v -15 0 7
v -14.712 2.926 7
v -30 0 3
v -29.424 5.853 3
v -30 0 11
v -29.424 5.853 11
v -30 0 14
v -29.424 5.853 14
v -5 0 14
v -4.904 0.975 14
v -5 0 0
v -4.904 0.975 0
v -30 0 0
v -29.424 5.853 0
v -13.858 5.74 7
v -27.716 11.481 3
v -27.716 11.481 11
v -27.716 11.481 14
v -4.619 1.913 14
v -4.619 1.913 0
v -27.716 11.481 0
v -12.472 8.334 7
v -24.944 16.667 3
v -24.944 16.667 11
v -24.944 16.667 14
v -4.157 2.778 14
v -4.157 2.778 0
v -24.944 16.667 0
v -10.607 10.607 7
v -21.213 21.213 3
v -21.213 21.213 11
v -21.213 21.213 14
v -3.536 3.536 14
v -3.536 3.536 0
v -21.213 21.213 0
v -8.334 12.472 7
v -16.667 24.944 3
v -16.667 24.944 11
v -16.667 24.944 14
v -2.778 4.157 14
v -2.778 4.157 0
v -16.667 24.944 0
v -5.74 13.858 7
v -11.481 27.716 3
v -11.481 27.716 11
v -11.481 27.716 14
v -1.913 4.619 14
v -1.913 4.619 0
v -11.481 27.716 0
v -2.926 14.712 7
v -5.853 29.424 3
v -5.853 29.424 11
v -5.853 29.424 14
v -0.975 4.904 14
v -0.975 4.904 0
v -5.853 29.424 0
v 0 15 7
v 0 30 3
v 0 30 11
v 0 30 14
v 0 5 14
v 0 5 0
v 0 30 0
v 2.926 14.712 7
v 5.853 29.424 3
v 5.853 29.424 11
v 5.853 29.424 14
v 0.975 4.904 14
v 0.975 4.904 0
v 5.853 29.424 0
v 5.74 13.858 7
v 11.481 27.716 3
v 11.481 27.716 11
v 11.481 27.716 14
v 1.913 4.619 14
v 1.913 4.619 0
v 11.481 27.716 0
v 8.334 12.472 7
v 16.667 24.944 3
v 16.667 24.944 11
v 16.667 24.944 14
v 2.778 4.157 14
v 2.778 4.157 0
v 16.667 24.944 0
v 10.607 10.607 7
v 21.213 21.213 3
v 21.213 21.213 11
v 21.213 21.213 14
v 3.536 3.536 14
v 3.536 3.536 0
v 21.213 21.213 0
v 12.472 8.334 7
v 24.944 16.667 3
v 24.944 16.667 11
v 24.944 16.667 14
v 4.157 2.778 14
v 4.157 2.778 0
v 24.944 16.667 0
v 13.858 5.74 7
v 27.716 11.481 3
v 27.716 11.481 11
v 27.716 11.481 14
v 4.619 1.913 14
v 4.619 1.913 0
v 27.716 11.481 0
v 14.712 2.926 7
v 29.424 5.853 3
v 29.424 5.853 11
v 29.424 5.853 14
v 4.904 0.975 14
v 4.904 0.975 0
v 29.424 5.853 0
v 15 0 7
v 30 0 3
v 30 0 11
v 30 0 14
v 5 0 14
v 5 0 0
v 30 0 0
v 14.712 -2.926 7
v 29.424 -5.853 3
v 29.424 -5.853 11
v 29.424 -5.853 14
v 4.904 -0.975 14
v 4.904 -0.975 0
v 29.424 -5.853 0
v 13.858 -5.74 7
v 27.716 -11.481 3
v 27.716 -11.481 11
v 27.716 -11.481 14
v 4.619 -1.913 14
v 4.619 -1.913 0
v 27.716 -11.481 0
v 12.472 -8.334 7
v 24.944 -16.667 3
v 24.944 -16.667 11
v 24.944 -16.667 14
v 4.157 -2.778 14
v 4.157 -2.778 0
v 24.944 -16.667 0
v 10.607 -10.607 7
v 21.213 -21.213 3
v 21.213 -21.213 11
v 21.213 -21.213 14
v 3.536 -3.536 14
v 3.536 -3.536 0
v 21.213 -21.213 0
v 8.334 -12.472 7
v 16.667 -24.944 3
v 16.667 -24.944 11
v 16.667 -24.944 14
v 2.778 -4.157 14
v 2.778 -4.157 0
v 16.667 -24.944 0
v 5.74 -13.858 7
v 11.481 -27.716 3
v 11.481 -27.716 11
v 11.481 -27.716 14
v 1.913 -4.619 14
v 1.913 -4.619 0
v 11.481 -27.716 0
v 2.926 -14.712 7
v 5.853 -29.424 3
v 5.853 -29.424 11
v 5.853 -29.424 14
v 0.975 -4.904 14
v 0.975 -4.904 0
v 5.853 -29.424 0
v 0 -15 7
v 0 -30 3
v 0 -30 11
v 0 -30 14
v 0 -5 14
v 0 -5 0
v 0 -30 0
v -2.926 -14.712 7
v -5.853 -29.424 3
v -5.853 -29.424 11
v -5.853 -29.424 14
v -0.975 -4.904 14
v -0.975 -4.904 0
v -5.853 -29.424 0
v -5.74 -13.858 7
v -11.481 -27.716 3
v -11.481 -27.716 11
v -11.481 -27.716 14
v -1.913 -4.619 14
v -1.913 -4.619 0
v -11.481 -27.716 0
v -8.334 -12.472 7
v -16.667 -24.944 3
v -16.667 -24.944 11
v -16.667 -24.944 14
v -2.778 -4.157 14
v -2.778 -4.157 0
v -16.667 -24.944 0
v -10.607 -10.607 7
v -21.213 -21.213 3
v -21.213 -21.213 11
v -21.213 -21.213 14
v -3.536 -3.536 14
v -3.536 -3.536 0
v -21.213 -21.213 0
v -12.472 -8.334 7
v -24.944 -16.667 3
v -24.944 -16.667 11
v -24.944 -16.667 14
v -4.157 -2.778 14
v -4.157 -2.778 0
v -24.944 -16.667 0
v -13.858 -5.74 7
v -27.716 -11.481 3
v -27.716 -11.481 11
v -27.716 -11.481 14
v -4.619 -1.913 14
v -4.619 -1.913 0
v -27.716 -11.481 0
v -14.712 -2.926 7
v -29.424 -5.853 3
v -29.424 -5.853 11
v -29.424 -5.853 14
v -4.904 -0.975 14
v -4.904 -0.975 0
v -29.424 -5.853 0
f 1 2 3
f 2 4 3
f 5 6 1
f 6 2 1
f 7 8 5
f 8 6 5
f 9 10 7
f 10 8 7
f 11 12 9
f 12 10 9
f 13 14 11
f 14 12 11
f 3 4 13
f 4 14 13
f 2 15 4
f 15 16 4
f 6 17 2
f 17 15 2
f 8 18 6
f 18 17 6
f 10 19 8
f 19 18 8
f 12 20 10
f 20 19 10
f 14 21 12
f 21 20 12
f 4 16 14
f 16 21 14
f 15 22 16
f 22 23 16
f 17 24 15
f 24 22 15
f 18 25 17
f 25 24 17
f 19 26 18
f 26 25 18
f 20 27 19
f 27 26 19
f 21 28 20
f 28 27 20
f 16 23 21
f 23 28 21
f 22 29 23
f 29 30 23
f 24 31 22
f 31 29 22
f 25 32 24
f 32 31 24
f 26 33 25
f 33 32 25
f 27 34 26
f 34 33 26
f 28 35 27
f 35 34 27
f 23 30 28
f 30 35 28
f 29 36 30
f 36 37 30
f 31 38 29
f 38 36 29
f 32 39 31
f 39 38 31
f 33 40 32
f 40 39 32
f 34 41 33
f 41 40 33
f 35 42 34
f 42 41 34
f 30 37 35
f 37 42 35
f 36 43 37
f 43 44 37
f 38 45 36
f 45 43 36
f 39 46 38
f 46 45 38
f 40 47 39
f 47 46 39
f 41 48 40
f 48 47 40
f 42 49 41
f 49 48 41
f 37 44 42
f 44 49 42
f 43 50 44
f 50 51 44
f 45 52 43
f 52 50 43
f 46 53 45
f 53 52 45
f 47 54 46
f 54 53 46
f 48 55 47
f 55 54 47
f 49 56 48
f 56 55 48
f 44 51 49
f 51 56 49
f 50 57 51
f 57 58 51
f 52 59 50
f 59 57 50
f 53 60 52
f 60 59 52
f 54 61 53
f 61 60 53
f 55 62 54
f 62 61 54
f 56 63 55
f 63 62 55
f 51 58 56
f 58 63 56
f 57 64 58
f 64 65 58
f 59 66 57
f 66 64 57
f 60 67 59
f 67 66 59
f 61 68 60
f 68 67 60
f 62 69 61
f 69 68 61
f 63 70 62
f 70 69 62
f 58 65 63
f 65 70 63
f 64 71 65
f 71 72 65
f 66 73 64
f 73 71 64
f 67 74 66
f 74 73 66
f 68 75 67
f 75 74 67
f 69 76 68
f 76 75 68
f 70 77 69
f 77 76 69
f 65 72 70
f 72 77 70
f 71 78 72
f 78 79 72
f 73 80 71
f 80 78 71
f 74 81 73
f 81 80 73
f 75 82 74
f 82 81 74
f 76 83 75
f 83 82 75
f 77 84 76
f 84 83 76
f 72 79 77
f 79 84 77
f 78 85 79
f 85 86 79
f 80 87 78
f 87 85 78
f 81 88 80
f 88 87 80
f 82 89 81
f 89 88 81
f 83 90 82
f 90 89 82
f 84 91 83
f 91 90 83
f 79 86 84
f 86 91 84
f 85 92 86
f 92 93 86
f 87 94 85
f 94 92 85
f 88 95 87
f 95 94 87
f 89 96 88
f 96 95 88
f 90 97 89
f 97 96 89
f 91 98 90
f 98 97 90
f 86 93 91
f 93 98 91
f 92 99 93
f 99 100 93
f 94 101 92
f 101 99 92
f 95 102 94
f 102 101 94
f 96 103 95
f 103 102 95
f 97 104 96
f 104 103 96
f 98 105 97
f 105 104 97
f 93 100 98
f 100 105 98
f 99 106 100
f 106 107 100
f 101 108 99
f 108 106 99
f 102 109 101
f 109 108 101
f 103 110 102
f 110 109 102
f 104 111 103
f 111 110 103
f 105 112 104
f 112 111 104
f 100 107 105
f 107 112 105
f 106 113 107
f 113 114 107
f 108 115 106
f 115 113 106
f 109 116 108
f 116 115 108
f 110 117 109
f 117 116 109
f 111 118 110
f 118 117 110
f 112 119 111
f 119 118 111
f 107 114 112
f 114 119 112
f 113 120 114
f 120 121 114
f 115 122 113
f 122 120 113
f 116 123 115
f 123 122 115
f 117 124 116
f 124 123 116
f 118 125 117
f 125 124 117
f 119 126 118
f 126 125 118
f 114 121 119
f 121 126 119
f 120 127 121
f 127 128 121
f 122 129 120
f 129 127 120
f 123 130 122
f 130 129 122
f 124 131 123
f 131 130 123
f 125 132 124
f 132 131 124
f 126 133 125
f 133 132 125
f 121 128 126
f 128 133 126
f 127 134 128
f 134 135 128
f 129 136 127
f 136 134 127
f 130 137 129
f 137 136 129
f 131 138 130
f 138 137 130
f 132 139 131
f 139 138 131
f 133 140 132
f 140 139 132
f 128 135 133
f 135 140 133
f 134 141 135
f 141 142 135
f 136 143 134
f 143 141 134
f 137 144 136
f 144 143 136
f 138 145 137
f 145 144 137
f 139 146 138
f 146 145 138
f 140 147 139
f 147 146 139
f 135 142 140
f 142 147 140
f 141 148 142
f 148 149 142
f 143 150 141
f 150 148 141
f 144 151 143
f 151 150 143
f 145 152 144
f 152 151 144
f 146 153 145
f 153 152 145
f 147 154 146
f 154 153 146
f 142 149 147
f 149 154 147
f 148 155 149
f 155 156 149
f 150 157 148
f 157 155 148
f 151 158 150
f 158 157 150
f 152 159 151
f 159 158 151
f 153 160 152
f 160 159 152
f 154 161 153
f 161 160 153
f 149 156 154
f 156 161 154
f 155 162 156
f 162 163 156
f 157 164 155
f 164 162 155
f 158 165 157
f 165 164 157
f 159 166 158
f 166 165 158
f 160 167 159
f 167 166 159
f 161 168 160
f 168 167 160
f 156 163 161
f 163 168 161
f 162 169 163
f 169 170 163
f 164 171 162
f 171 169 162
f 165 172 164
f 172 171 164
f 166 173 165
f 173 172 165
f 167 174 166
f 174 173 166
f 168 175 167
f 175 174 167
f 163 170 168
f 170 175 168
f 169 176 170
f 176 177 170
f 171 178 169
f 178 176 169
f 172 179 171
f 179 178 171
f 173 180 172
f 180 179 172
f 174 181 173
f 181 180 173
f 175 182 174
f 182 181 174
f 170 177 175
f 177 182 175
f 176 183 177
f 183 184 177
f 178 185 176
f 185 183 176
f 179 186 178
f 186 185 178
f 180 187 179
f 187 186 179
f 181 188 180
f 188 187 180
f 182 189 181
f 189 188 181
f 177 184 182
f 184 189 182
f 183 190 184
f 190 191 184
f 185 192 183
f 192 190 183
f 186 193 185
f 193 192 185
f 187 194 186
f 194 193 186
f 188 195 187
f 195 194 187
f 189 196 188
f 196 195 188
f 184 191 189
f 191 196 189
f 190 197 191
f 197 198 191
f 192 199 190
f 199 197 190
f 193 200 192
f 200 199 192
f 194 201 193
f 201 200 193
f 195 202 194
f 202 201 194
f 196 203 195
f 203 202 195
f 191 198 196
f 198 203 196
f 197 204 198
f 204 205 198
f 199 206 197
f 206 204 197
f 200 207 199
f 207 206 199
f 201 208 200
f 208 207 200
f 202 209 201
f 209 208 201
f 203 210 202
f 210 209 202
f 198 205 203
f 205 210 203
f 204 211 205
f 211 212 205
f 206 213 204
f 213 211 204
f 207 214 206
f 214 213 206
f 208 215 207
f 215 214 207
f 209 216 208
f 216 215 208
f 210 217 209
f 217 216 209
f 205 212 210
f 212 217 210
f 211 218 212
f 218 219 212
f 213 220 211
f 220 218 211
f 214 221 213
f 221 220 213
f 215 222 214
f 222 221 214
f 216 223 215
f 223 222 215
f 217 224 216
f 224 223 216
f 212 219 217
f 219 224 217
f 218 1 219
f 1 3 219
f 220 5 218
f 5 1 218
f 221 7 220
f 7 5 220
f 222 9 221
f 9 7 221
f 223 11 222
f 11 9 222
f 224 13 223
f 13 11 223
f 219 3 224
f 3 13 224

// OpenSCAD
$fn = 32;

// ----------------------------------------------------------------------
// Revolved part: V-groove pulley R30
// ----------------------------------------------------------------------

// --- parameters (mm) ---
bore_r = 5;               // bore radius
rim_r = 30;               // rim radius
rim_t = 14;               // rim width
groove_r = 15;            // groove root radius
groove_w = 4;             // groove half width
revolve_angle = 360;      // revolve sweep, degrees

bore_d = 2 * bore_r;
rim_d = 2 * rim_r;
groove_d = 2 * groove_r;

profile = [[5, 0], [30, 0], [30, 3], [15, 7], [30, 11], [30, 14], [5, 14]];  // primary outline, 7 points, counter clockwise

// --- the one profile operation ---
rotate_extrude(angle = revolve_angle) polygon(points = profile);
